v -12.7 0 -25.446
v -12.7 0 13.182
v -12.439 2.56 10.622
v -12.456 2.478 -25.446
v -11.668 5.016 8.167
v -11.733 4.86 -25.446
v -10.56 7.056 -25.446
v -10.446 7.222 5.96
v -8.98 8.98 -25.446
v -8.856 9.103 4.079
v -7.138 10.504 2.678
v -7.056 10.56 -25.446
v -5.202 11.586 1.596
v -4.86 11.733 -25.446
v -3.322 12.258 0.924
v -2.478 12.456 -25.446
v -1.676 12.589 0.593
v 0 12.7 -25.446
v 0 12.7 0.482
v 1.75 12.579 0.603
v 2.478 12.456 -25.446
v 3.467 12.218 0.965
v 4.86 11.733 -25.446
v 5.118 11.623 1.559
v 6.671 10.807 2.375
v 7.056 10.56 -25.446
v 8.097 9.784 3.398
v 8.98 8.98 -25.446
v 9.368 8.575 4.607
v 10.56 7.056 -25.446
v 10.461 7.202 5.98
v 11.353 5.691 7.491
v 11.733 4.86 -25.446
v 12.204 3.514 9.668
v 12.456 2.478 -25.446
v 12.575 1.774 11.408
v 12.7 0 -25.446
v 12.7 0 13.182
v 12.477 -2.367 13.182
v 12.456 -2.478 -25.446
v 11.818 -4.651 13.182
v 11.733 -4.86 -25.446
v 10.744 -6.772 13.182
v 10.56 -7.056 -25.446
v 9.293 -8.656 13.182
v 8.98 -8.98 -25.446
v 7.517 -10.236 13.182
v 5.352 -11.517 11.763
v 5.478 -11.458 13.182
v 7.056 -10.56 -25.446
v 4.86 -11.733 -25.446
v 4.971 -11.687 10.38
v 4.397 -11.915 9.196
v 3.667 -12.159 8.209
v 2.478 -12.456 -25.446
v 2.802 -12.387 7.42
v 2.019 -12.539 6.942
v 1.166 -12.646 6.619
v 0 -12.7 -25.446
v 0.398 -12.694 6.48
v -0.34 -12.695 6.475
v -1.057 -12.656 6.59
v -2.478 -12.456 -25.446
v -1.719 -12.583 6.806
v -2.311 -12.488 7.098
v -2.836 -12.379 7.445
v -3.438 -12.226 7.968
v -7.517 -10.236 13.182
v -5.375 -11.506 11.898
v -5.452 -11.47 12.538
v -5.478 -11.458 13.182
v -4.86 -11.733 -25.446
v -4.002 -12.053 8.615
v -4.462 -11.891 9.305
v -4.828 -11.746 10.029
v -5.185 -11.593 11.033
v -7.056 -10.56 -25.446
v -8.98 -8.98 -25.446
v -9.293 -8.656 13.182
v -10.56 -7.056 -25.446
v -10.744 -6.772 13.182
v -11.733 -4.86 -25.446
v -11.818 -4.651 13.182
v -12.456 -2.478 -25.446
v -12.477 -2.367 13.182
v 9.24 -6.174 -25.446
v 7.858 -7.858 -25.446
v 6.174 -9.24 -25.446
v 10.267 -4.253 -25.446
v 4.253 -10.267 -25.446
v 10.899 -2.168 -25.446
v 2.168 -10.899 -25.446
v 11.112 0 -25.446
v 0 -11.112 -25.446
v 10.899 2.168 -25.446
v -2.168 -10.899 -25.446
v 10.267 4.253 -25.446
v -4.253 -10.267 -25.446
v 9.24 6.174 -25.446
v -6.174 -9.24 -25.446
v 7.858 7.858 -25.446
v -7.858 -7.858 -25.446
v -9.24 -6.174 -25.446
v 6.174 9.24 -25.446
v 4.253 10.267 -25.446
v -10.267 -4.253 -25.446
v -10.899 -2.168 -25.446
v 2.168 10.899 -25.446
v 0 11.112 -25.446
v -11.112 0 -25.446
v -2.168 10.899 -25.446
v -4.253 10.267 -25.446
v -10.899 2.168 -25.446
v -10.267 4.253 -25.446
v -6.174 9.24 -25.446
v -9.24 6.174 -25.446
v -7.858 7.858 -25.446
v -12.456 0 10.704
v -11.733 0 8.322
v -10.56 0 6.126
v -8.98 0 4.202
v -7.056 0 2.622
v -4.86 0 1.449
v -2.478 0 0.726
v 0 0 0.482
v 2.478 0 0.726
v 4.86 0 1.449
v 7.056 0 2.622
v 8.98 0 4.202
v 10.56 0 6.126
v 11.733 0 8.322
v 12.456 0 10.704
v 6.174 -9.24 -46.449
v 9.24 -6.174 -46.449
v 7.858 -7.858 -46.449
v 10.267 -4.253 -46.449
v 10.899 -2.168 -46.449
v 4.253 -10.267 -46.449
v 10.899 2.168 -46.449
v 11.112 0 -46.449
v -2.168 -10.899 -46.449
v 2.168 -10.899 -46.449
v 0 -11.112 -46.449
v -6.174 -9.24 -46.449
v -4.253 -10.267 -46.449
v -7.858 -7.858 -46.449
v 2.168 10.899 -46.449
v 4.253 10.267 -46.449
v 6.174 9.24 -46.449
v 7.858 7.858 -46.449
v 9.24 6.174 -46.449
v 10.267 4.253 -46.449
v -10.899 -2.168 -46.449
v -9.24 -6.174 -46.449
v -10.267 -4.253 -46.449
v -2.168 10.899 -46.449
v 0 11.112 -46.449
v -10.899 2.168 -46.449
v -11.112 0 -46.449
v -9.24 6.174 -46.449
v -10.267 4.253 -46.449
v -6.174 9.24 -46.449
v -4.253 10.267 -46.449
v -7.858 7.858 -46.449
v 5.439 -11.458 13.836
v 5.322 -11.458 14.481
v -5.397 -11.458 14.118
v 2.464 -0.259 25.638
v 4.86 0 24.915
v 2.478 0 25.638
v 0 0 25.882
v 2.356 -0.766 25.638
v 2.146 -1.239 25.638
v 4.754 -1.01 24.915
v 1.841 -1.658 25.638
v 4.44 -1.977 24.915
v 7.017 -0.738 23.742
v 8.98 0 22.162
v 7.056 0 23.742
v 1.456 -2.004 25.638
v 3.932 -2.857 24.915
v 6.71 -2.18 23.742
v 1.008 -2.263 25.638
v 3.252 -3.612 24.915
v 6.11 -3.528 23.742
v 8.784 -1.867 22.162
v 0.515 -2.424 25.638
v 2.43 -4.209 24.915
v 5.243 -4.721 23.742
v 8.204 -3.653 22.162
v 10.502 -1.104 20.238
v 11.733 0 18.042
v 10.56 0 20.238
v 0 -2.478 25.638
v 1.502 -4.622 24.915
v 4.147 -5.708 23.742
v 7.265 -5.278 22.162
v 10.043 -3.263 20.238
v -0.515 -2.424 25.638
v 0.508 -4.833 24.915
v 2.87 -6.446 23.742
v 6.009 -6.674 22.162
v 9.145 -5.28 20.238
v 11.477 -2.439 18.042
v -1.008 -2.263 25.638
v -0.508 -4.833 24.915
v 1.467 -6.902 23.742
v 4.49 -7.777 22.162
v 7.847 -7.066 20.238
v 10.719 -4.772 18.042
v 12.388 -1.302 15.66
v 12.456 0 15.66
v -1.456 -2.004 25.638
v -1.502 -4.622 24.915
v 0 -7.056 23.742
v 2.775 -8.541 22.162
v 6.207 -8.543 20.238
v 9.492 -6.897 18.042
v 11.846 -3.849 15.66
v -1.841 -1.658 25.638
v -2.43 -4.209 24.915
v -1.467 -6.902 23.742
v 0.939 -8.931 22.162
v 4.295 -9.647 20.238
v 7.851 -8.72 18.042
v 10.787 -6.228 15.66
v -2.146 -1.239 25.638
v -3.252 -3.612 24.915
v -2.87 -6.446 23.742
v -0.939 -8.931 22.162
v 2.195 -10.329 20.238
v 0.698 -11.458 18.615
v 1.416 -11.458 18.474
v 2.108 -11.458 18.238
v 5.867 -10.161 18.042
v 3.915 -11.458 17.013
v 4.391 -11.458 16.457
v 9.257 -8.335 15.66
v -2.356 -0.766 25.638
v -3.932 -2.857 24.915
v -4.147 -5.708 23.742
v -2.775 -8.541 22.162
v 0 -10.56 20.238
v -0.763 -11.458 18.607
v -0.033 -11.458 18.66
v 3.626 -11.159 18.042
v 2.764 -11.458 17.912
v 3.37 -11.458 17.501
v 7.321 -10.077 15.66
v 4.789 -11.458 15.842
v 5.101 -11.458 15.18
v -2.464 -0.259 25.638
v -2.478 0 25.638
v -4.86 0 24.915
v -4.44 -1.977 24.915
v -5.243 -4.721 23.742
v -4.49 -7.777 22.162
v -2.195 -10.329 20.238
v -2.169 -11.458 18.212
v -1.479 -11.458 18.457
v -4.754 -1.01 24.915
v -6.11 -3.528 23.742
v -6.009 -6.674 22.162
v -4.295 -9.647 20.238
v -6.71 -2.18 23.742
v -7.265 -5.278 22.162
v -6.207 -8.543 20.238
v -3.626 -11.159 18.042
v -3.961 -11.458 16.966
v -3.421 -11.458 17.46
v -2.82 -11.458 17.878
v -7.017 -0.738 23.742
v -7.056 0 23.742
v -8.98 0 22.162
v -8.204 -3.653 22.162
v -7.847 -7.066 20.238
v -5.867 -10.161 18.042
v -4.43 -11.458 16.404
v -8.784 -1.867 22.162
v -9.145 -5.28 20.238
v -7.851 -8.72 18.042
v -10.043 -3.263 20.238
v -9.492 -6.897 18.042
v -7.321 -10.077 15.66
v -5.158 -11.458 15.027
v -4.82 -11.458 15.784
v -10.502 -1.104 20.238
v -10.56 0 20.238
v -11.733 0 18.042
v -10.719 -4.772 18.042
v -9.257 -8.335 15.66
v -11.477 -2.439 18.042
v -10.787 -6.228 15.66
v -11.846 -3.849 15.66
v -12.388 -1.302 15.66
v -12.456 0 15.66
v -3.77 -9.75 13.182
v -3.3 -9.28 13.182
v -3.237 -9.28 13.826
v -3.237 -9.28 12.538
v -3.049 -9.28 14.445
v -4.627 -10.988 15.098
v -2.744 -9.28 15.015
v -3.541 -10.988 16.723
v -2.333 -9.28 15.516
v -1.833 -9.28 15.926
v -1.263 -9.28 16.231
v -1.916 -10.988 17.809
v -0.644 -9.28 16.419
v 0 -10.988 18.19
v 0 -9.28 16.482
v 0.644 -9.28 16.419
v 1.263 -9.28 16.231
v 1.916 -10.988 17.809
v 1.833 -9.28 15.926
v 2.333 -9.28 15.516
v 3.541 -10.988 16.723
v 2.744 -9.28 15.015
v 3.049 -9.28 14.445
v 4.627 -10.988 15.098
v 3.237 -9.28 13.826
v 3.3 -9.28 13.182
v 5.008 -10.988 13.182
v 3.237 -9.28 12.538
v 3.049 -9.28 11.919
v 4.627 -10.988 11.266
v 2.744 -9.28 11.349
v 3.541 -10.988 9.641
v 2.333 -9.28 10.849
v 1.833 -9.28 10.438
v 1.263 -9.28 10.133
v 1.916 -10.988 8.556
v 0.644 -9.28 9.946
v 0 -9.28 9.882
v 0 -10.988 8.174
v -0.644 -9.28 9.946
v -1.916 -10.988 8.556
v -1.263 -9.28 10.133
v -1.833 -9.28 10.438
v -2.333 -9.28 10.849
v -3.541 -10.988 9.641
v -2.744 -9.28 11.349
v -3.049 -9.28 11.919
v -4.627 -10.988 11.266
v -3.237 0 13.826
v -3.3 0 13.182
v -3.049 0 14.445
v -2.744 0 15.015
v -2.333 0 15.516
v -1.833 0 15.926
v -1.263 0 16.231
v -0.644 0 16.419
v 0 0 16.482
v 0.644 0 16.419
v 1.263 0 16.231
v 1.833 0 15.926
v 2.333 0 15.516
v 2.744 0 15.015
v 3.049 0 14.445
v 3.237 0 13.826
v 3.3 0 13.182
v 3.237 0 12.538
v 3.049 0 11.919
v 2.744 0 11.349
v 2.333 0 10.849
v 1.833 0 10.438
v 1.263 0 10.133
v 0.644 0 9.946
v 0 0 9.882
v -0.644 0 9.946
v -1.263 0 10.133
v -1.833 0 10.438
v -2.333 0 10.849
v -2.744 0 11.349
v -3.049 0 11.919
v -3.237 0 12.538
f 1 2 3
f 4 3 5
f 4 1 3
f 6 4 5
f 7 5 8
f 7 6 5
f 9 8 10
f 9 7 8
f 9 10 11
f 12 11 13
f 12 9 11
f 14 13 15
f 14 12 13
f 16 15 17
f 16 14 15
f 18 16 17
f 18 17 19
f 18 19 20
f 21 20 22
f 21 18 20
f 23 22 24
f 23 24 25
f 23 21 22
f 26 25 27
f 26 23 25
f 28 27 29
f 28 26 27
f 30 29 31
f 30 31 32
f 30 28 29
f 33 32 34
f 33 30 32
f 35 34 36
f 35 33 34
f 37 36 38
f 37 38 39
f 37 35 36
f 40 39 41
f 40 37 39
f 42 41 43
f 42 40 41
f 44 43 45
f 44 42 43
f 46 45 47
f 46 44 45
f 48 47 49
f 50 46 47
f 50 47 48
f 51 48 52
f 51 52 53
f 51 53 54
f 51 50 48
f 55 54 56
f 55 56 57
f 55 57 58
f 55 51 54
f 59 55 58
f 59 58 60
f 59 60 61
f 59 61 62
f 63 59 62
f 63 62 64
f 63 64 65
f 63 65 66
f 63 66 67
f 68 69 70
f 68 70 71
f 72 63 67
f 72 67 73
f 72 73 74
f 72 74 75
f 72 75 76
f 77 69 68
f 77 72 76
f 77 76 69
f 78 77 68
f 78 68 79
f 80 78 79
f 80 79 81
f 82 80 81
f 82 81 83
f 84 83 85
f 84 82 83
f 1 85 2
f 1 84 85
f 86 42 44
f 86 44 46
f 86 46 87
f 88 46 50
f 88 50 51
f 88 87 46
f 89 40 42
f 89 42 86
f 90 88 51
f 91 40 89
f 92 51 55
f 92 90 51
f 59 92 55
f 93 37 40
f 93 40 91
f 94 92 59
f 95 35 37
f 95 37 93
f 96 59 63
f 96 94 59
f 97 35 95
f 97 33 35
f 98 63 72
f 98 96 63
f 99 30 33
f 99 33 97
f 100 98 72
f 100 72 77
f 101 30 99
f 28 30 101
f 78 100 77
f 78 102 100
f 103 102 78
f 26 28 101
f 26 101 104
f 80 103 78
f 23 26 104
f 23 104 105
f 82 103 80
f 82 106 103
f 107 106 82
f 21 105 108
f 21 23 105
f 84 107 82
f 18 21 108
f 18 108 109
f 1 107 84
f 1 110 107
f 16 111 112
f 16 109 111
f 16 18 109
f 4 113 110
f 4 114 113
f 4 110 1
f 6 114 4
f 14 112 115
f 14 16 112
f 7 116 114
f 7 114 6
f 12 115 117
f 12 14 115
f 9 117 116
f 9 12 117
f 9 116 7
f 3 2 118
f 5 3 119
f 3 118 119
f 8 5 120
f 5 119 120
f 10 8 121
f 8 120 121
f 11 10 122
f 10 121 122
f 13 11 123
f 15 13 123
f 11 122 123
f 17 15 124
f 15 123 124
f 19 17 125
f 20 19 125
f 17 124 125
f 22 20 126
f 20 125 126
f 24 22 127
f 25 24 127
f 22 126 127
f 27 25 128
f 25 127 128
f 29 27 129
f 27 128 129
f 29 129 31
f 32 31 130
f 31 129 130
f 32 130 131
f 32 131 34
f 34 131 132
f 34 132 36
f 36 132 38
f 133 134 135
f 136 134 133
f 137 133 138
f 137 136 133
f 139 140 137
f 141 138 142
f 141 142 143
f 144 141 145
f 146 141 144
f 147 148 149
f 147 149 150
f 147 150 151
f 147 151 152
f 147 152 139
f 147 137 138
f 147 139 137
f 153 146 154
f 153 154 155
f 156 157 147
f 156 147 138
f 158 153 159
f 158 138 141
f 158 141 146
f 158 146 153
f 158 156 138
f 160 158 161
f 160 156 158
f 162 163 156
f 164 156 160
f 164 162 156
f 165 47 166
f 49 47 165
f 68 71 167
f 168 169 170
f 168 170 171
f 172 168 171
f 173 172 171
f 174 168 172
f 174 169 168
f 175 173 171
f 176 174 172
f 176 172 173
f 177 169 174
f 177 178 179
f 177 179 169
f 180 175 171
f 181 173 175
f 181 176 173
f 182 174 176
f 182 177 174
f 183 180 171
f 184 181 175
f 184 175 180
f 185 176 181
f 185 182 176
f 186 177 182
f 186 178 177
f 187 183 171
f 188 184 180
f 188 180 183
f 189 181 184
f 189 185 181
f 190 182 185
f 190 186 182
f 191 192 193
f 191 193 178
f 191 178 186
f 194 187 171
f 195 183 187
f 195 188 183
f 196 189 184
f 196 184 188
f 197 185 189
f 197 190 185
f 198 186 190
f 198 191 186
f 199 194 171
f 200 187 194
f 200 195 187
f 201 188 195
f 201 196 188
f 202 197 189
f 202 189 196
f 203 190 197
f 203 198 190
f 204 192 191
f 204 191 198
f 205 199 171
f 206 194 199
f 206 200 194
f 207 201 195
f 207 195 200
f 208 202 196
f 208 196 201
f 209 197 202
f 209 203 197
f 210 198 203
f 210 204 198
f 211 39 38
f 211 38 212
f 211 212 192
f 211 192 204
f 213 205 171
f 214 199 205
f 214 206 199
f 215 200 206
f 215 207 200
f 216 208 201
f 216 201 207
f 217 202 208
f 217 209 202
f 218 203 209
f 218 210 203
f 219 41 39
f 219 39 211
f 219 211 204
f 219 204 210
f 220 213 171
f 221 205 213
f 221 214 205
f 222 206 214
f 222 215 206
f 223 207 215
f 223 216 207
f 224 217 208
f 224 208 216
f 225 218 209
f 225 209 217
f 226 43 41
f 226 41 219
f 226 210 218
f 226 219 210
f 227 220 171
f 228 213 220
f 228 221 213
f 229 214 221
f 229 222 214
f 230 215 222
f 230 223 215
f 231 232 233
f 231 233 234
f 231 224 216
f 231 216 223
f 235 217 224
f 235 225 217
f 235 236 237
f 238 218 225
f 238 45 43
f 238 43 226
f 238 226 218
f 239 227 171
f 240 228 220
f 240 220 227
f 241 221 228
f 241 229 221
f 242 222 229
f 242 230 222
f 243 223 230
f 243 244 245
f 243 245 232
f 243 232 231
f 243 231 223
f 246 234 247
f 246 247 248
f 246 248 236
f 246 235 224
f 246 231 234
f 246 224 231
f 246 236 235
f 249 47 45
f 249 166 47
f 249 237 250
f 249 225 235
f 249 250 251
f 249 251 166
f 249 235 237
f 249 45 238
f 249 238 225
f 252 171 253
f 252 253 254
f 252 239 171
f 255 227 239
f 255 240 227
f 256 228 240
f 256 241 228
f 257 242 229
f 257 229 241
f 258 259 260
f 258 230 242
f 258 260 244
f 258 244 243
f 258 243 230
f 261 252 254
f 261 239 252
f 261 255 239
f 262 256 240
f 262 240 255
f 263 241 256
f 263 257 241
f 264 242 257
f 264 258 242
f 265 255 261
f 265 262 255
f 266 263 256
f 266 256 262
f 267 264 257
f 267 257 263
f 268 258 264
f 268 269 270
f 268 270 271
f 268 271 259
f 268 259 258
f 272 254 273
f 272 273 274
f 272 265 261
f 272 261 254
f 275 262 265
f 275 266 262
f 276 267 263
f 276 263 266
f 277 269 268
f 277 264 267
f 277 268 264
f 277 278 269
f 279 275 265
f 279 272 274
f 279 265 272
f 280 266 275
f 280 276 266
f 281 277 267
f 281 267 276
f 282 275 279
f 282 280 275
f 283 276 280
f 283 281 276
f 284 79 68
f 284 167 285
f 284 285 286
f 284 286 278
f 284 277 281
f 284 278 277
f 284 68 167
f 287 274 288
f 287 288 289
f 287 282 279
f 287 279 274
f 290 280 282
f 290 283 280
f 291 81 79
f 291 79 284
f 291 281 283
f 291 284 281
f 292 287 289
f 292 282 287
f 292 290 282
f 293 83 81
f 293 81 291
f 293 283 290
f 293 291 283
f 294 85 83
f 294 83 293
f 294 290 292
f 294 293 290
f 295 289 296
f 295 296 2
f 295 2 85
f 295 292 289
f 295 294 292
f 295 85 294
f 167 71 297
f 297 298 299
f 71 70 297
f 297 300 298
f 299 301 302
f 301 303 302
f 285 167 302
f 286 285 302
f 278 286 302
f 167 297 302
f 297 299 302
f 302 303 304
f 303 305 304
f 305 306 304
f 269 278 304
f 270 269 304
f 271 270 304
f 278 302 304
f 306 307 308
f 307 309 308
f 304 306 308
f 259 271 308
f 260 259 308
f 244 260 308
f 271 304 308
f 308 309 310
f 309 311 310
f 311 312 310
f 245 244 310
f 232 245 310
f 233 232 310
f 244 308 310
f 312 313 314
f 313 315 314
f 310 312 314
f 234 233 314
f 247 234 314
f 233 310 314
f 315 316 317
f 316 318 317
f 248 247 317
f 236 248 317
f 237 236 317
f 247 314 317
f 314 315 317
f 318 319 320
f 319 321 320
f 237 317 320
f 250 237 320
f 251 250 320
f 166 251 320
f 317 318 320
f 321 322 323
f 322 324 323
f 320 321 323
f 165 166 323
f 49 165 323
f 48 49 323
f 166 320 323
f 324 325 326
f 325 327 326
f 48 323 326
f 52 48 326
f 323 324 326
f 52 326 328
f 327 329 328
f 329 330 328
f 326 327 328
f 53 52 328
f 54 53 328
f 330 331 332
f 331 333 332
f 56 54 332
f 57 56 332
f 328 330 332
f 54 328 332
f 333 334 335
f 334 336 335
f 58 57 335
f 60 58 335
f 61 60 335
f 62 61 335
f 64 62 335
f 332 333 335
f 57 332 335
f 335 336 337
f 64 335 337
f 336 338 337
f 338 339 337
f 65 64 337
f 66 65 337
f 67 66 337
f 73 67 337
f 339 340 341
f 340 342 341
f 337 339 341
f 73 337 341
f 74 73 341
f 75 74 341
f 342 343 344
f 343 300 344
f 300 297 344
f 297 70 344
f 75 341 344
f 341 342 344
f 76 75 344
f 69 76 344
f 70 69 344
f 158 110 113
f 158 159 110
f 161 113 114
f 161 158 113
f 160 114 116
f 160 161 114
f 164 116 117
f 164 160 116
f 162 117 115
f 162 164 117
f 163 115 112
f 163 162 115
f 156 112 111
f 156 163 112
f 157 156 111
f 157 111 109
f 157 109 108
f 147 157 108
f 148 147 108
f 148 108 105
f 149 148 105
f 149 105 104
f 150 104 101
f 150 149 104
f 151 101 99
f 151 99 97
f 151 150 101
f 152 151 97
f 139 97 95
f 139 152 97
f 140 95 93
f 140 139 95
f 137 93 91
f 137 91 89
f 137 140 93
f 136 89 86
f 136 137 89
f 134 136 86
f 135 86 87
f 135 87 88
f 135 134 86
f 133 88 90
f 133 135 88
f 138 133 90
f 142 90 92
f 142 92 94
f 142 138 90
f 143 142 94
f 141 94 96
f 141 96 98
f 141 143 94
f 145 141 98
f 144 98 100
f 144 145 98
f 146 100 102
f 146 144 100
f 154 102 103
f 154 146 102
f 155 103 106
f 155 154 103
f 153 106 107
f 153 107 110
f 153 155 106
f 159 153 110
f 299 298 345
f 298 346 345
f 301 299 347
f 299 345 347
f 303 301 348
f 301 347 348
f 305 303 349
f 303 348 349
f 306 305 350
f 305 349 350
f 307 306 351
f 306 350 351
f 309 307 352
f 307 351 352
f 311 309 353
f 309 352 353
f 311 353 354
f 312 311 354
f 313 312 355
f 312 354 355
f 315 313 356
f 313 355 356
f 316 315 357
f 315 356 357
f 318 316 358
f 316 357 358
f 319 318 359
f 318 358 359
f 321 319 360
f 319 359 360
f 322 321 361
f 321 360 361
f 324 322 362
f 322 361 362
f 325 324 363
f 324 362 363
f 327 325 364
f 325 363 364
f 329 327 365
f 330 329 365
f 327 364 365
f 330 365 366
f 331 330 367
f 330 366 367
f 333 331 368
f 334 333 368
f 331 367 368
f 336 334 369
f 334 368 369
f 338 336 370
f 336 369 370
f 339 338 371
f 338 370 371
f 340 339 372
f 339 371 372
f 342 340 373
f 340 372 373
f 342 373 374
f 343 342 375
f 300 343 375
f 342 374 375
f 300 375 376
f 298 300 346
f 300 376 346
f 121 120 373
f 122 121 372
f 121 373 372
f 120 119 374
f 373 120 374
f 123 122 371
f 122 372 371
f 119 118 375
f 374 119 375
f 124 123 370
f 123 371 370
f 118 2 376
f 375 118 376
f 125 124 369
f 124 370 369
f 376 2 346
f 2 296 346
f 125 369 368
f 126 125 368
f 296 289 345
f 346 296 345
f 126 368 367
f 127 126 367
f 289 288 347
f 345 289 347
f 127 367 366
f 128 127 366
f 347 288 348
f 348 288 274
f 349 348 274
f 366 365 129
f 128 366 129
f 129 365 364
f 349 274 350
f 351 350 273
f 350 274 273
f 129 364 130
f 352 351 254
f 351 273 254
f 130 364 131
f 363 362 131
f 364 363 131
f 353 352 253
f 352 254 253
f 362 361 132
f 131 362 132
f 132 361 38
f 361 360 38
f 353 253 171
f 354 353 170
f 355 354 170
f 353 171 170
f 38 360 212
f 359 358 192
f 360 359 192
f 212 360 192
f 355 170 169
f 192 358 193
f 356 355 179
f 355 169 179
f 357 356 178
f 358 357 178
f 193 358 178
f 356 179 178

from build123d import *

# Parameters (mm, degrees)
F2_R           = 12.7
F3_DEPTH       = 12.701
F6_D           = 6.6
F6_CSINK_D     = 13.44
F6_CSINK_ANGLE = 90


# Not quite as in the source:
# - a length typed as a fraction of an inch, garbled in the dataset ("3 / 203.2 mm" for 3/8 in), is restored


with BuildPart() as f1:
    # F0 (on Front) → F1 (revolve)
    with BuildSketch(Plane.XZ):
        with BuildLine():
            Line((0, -46.4494958016), (0, 25.8821103648))
            ThreePointArc((0, 25.8821103648), (-8.9802561211, 22.1623664858), (-12.7, 13.1821103648))
            Line((-12.7, 13.1821103648), (-12.7, -25.4462463191))
            Line((-12.7, -25.4462463191), (-11.1125, -25.4462463191))
            Line((-11.1125, -25.4462463191), (-11.1125, -46.4494958016))
            Line((-11.1125, -46.4494958016), (0, -46.4494958016))
        make_face()
    revolve(axis=Axis((0, 0, -7.9082977027), (0, 0, -1)))

    # F2 (on Front) → F3 (cut, through all)
    with BuildSketch(Plane.XZ):
        with Locations((0, 13.1821103648)):
            Circle(F2_R)
    extrude(amount=-F3_DEPTH, mode=Mode.SUBTRACT)

    # F6 (through all)
    with Locations(Plane.XZ.offset(12.7)):
        with Locations((0, 13.1821103648)):
            CounterSinkHole(F6_D / 2, F6_CSINK_D / 2, counter_sink_angle=F6_CSINK_ANGLE)


solid = f1.part
